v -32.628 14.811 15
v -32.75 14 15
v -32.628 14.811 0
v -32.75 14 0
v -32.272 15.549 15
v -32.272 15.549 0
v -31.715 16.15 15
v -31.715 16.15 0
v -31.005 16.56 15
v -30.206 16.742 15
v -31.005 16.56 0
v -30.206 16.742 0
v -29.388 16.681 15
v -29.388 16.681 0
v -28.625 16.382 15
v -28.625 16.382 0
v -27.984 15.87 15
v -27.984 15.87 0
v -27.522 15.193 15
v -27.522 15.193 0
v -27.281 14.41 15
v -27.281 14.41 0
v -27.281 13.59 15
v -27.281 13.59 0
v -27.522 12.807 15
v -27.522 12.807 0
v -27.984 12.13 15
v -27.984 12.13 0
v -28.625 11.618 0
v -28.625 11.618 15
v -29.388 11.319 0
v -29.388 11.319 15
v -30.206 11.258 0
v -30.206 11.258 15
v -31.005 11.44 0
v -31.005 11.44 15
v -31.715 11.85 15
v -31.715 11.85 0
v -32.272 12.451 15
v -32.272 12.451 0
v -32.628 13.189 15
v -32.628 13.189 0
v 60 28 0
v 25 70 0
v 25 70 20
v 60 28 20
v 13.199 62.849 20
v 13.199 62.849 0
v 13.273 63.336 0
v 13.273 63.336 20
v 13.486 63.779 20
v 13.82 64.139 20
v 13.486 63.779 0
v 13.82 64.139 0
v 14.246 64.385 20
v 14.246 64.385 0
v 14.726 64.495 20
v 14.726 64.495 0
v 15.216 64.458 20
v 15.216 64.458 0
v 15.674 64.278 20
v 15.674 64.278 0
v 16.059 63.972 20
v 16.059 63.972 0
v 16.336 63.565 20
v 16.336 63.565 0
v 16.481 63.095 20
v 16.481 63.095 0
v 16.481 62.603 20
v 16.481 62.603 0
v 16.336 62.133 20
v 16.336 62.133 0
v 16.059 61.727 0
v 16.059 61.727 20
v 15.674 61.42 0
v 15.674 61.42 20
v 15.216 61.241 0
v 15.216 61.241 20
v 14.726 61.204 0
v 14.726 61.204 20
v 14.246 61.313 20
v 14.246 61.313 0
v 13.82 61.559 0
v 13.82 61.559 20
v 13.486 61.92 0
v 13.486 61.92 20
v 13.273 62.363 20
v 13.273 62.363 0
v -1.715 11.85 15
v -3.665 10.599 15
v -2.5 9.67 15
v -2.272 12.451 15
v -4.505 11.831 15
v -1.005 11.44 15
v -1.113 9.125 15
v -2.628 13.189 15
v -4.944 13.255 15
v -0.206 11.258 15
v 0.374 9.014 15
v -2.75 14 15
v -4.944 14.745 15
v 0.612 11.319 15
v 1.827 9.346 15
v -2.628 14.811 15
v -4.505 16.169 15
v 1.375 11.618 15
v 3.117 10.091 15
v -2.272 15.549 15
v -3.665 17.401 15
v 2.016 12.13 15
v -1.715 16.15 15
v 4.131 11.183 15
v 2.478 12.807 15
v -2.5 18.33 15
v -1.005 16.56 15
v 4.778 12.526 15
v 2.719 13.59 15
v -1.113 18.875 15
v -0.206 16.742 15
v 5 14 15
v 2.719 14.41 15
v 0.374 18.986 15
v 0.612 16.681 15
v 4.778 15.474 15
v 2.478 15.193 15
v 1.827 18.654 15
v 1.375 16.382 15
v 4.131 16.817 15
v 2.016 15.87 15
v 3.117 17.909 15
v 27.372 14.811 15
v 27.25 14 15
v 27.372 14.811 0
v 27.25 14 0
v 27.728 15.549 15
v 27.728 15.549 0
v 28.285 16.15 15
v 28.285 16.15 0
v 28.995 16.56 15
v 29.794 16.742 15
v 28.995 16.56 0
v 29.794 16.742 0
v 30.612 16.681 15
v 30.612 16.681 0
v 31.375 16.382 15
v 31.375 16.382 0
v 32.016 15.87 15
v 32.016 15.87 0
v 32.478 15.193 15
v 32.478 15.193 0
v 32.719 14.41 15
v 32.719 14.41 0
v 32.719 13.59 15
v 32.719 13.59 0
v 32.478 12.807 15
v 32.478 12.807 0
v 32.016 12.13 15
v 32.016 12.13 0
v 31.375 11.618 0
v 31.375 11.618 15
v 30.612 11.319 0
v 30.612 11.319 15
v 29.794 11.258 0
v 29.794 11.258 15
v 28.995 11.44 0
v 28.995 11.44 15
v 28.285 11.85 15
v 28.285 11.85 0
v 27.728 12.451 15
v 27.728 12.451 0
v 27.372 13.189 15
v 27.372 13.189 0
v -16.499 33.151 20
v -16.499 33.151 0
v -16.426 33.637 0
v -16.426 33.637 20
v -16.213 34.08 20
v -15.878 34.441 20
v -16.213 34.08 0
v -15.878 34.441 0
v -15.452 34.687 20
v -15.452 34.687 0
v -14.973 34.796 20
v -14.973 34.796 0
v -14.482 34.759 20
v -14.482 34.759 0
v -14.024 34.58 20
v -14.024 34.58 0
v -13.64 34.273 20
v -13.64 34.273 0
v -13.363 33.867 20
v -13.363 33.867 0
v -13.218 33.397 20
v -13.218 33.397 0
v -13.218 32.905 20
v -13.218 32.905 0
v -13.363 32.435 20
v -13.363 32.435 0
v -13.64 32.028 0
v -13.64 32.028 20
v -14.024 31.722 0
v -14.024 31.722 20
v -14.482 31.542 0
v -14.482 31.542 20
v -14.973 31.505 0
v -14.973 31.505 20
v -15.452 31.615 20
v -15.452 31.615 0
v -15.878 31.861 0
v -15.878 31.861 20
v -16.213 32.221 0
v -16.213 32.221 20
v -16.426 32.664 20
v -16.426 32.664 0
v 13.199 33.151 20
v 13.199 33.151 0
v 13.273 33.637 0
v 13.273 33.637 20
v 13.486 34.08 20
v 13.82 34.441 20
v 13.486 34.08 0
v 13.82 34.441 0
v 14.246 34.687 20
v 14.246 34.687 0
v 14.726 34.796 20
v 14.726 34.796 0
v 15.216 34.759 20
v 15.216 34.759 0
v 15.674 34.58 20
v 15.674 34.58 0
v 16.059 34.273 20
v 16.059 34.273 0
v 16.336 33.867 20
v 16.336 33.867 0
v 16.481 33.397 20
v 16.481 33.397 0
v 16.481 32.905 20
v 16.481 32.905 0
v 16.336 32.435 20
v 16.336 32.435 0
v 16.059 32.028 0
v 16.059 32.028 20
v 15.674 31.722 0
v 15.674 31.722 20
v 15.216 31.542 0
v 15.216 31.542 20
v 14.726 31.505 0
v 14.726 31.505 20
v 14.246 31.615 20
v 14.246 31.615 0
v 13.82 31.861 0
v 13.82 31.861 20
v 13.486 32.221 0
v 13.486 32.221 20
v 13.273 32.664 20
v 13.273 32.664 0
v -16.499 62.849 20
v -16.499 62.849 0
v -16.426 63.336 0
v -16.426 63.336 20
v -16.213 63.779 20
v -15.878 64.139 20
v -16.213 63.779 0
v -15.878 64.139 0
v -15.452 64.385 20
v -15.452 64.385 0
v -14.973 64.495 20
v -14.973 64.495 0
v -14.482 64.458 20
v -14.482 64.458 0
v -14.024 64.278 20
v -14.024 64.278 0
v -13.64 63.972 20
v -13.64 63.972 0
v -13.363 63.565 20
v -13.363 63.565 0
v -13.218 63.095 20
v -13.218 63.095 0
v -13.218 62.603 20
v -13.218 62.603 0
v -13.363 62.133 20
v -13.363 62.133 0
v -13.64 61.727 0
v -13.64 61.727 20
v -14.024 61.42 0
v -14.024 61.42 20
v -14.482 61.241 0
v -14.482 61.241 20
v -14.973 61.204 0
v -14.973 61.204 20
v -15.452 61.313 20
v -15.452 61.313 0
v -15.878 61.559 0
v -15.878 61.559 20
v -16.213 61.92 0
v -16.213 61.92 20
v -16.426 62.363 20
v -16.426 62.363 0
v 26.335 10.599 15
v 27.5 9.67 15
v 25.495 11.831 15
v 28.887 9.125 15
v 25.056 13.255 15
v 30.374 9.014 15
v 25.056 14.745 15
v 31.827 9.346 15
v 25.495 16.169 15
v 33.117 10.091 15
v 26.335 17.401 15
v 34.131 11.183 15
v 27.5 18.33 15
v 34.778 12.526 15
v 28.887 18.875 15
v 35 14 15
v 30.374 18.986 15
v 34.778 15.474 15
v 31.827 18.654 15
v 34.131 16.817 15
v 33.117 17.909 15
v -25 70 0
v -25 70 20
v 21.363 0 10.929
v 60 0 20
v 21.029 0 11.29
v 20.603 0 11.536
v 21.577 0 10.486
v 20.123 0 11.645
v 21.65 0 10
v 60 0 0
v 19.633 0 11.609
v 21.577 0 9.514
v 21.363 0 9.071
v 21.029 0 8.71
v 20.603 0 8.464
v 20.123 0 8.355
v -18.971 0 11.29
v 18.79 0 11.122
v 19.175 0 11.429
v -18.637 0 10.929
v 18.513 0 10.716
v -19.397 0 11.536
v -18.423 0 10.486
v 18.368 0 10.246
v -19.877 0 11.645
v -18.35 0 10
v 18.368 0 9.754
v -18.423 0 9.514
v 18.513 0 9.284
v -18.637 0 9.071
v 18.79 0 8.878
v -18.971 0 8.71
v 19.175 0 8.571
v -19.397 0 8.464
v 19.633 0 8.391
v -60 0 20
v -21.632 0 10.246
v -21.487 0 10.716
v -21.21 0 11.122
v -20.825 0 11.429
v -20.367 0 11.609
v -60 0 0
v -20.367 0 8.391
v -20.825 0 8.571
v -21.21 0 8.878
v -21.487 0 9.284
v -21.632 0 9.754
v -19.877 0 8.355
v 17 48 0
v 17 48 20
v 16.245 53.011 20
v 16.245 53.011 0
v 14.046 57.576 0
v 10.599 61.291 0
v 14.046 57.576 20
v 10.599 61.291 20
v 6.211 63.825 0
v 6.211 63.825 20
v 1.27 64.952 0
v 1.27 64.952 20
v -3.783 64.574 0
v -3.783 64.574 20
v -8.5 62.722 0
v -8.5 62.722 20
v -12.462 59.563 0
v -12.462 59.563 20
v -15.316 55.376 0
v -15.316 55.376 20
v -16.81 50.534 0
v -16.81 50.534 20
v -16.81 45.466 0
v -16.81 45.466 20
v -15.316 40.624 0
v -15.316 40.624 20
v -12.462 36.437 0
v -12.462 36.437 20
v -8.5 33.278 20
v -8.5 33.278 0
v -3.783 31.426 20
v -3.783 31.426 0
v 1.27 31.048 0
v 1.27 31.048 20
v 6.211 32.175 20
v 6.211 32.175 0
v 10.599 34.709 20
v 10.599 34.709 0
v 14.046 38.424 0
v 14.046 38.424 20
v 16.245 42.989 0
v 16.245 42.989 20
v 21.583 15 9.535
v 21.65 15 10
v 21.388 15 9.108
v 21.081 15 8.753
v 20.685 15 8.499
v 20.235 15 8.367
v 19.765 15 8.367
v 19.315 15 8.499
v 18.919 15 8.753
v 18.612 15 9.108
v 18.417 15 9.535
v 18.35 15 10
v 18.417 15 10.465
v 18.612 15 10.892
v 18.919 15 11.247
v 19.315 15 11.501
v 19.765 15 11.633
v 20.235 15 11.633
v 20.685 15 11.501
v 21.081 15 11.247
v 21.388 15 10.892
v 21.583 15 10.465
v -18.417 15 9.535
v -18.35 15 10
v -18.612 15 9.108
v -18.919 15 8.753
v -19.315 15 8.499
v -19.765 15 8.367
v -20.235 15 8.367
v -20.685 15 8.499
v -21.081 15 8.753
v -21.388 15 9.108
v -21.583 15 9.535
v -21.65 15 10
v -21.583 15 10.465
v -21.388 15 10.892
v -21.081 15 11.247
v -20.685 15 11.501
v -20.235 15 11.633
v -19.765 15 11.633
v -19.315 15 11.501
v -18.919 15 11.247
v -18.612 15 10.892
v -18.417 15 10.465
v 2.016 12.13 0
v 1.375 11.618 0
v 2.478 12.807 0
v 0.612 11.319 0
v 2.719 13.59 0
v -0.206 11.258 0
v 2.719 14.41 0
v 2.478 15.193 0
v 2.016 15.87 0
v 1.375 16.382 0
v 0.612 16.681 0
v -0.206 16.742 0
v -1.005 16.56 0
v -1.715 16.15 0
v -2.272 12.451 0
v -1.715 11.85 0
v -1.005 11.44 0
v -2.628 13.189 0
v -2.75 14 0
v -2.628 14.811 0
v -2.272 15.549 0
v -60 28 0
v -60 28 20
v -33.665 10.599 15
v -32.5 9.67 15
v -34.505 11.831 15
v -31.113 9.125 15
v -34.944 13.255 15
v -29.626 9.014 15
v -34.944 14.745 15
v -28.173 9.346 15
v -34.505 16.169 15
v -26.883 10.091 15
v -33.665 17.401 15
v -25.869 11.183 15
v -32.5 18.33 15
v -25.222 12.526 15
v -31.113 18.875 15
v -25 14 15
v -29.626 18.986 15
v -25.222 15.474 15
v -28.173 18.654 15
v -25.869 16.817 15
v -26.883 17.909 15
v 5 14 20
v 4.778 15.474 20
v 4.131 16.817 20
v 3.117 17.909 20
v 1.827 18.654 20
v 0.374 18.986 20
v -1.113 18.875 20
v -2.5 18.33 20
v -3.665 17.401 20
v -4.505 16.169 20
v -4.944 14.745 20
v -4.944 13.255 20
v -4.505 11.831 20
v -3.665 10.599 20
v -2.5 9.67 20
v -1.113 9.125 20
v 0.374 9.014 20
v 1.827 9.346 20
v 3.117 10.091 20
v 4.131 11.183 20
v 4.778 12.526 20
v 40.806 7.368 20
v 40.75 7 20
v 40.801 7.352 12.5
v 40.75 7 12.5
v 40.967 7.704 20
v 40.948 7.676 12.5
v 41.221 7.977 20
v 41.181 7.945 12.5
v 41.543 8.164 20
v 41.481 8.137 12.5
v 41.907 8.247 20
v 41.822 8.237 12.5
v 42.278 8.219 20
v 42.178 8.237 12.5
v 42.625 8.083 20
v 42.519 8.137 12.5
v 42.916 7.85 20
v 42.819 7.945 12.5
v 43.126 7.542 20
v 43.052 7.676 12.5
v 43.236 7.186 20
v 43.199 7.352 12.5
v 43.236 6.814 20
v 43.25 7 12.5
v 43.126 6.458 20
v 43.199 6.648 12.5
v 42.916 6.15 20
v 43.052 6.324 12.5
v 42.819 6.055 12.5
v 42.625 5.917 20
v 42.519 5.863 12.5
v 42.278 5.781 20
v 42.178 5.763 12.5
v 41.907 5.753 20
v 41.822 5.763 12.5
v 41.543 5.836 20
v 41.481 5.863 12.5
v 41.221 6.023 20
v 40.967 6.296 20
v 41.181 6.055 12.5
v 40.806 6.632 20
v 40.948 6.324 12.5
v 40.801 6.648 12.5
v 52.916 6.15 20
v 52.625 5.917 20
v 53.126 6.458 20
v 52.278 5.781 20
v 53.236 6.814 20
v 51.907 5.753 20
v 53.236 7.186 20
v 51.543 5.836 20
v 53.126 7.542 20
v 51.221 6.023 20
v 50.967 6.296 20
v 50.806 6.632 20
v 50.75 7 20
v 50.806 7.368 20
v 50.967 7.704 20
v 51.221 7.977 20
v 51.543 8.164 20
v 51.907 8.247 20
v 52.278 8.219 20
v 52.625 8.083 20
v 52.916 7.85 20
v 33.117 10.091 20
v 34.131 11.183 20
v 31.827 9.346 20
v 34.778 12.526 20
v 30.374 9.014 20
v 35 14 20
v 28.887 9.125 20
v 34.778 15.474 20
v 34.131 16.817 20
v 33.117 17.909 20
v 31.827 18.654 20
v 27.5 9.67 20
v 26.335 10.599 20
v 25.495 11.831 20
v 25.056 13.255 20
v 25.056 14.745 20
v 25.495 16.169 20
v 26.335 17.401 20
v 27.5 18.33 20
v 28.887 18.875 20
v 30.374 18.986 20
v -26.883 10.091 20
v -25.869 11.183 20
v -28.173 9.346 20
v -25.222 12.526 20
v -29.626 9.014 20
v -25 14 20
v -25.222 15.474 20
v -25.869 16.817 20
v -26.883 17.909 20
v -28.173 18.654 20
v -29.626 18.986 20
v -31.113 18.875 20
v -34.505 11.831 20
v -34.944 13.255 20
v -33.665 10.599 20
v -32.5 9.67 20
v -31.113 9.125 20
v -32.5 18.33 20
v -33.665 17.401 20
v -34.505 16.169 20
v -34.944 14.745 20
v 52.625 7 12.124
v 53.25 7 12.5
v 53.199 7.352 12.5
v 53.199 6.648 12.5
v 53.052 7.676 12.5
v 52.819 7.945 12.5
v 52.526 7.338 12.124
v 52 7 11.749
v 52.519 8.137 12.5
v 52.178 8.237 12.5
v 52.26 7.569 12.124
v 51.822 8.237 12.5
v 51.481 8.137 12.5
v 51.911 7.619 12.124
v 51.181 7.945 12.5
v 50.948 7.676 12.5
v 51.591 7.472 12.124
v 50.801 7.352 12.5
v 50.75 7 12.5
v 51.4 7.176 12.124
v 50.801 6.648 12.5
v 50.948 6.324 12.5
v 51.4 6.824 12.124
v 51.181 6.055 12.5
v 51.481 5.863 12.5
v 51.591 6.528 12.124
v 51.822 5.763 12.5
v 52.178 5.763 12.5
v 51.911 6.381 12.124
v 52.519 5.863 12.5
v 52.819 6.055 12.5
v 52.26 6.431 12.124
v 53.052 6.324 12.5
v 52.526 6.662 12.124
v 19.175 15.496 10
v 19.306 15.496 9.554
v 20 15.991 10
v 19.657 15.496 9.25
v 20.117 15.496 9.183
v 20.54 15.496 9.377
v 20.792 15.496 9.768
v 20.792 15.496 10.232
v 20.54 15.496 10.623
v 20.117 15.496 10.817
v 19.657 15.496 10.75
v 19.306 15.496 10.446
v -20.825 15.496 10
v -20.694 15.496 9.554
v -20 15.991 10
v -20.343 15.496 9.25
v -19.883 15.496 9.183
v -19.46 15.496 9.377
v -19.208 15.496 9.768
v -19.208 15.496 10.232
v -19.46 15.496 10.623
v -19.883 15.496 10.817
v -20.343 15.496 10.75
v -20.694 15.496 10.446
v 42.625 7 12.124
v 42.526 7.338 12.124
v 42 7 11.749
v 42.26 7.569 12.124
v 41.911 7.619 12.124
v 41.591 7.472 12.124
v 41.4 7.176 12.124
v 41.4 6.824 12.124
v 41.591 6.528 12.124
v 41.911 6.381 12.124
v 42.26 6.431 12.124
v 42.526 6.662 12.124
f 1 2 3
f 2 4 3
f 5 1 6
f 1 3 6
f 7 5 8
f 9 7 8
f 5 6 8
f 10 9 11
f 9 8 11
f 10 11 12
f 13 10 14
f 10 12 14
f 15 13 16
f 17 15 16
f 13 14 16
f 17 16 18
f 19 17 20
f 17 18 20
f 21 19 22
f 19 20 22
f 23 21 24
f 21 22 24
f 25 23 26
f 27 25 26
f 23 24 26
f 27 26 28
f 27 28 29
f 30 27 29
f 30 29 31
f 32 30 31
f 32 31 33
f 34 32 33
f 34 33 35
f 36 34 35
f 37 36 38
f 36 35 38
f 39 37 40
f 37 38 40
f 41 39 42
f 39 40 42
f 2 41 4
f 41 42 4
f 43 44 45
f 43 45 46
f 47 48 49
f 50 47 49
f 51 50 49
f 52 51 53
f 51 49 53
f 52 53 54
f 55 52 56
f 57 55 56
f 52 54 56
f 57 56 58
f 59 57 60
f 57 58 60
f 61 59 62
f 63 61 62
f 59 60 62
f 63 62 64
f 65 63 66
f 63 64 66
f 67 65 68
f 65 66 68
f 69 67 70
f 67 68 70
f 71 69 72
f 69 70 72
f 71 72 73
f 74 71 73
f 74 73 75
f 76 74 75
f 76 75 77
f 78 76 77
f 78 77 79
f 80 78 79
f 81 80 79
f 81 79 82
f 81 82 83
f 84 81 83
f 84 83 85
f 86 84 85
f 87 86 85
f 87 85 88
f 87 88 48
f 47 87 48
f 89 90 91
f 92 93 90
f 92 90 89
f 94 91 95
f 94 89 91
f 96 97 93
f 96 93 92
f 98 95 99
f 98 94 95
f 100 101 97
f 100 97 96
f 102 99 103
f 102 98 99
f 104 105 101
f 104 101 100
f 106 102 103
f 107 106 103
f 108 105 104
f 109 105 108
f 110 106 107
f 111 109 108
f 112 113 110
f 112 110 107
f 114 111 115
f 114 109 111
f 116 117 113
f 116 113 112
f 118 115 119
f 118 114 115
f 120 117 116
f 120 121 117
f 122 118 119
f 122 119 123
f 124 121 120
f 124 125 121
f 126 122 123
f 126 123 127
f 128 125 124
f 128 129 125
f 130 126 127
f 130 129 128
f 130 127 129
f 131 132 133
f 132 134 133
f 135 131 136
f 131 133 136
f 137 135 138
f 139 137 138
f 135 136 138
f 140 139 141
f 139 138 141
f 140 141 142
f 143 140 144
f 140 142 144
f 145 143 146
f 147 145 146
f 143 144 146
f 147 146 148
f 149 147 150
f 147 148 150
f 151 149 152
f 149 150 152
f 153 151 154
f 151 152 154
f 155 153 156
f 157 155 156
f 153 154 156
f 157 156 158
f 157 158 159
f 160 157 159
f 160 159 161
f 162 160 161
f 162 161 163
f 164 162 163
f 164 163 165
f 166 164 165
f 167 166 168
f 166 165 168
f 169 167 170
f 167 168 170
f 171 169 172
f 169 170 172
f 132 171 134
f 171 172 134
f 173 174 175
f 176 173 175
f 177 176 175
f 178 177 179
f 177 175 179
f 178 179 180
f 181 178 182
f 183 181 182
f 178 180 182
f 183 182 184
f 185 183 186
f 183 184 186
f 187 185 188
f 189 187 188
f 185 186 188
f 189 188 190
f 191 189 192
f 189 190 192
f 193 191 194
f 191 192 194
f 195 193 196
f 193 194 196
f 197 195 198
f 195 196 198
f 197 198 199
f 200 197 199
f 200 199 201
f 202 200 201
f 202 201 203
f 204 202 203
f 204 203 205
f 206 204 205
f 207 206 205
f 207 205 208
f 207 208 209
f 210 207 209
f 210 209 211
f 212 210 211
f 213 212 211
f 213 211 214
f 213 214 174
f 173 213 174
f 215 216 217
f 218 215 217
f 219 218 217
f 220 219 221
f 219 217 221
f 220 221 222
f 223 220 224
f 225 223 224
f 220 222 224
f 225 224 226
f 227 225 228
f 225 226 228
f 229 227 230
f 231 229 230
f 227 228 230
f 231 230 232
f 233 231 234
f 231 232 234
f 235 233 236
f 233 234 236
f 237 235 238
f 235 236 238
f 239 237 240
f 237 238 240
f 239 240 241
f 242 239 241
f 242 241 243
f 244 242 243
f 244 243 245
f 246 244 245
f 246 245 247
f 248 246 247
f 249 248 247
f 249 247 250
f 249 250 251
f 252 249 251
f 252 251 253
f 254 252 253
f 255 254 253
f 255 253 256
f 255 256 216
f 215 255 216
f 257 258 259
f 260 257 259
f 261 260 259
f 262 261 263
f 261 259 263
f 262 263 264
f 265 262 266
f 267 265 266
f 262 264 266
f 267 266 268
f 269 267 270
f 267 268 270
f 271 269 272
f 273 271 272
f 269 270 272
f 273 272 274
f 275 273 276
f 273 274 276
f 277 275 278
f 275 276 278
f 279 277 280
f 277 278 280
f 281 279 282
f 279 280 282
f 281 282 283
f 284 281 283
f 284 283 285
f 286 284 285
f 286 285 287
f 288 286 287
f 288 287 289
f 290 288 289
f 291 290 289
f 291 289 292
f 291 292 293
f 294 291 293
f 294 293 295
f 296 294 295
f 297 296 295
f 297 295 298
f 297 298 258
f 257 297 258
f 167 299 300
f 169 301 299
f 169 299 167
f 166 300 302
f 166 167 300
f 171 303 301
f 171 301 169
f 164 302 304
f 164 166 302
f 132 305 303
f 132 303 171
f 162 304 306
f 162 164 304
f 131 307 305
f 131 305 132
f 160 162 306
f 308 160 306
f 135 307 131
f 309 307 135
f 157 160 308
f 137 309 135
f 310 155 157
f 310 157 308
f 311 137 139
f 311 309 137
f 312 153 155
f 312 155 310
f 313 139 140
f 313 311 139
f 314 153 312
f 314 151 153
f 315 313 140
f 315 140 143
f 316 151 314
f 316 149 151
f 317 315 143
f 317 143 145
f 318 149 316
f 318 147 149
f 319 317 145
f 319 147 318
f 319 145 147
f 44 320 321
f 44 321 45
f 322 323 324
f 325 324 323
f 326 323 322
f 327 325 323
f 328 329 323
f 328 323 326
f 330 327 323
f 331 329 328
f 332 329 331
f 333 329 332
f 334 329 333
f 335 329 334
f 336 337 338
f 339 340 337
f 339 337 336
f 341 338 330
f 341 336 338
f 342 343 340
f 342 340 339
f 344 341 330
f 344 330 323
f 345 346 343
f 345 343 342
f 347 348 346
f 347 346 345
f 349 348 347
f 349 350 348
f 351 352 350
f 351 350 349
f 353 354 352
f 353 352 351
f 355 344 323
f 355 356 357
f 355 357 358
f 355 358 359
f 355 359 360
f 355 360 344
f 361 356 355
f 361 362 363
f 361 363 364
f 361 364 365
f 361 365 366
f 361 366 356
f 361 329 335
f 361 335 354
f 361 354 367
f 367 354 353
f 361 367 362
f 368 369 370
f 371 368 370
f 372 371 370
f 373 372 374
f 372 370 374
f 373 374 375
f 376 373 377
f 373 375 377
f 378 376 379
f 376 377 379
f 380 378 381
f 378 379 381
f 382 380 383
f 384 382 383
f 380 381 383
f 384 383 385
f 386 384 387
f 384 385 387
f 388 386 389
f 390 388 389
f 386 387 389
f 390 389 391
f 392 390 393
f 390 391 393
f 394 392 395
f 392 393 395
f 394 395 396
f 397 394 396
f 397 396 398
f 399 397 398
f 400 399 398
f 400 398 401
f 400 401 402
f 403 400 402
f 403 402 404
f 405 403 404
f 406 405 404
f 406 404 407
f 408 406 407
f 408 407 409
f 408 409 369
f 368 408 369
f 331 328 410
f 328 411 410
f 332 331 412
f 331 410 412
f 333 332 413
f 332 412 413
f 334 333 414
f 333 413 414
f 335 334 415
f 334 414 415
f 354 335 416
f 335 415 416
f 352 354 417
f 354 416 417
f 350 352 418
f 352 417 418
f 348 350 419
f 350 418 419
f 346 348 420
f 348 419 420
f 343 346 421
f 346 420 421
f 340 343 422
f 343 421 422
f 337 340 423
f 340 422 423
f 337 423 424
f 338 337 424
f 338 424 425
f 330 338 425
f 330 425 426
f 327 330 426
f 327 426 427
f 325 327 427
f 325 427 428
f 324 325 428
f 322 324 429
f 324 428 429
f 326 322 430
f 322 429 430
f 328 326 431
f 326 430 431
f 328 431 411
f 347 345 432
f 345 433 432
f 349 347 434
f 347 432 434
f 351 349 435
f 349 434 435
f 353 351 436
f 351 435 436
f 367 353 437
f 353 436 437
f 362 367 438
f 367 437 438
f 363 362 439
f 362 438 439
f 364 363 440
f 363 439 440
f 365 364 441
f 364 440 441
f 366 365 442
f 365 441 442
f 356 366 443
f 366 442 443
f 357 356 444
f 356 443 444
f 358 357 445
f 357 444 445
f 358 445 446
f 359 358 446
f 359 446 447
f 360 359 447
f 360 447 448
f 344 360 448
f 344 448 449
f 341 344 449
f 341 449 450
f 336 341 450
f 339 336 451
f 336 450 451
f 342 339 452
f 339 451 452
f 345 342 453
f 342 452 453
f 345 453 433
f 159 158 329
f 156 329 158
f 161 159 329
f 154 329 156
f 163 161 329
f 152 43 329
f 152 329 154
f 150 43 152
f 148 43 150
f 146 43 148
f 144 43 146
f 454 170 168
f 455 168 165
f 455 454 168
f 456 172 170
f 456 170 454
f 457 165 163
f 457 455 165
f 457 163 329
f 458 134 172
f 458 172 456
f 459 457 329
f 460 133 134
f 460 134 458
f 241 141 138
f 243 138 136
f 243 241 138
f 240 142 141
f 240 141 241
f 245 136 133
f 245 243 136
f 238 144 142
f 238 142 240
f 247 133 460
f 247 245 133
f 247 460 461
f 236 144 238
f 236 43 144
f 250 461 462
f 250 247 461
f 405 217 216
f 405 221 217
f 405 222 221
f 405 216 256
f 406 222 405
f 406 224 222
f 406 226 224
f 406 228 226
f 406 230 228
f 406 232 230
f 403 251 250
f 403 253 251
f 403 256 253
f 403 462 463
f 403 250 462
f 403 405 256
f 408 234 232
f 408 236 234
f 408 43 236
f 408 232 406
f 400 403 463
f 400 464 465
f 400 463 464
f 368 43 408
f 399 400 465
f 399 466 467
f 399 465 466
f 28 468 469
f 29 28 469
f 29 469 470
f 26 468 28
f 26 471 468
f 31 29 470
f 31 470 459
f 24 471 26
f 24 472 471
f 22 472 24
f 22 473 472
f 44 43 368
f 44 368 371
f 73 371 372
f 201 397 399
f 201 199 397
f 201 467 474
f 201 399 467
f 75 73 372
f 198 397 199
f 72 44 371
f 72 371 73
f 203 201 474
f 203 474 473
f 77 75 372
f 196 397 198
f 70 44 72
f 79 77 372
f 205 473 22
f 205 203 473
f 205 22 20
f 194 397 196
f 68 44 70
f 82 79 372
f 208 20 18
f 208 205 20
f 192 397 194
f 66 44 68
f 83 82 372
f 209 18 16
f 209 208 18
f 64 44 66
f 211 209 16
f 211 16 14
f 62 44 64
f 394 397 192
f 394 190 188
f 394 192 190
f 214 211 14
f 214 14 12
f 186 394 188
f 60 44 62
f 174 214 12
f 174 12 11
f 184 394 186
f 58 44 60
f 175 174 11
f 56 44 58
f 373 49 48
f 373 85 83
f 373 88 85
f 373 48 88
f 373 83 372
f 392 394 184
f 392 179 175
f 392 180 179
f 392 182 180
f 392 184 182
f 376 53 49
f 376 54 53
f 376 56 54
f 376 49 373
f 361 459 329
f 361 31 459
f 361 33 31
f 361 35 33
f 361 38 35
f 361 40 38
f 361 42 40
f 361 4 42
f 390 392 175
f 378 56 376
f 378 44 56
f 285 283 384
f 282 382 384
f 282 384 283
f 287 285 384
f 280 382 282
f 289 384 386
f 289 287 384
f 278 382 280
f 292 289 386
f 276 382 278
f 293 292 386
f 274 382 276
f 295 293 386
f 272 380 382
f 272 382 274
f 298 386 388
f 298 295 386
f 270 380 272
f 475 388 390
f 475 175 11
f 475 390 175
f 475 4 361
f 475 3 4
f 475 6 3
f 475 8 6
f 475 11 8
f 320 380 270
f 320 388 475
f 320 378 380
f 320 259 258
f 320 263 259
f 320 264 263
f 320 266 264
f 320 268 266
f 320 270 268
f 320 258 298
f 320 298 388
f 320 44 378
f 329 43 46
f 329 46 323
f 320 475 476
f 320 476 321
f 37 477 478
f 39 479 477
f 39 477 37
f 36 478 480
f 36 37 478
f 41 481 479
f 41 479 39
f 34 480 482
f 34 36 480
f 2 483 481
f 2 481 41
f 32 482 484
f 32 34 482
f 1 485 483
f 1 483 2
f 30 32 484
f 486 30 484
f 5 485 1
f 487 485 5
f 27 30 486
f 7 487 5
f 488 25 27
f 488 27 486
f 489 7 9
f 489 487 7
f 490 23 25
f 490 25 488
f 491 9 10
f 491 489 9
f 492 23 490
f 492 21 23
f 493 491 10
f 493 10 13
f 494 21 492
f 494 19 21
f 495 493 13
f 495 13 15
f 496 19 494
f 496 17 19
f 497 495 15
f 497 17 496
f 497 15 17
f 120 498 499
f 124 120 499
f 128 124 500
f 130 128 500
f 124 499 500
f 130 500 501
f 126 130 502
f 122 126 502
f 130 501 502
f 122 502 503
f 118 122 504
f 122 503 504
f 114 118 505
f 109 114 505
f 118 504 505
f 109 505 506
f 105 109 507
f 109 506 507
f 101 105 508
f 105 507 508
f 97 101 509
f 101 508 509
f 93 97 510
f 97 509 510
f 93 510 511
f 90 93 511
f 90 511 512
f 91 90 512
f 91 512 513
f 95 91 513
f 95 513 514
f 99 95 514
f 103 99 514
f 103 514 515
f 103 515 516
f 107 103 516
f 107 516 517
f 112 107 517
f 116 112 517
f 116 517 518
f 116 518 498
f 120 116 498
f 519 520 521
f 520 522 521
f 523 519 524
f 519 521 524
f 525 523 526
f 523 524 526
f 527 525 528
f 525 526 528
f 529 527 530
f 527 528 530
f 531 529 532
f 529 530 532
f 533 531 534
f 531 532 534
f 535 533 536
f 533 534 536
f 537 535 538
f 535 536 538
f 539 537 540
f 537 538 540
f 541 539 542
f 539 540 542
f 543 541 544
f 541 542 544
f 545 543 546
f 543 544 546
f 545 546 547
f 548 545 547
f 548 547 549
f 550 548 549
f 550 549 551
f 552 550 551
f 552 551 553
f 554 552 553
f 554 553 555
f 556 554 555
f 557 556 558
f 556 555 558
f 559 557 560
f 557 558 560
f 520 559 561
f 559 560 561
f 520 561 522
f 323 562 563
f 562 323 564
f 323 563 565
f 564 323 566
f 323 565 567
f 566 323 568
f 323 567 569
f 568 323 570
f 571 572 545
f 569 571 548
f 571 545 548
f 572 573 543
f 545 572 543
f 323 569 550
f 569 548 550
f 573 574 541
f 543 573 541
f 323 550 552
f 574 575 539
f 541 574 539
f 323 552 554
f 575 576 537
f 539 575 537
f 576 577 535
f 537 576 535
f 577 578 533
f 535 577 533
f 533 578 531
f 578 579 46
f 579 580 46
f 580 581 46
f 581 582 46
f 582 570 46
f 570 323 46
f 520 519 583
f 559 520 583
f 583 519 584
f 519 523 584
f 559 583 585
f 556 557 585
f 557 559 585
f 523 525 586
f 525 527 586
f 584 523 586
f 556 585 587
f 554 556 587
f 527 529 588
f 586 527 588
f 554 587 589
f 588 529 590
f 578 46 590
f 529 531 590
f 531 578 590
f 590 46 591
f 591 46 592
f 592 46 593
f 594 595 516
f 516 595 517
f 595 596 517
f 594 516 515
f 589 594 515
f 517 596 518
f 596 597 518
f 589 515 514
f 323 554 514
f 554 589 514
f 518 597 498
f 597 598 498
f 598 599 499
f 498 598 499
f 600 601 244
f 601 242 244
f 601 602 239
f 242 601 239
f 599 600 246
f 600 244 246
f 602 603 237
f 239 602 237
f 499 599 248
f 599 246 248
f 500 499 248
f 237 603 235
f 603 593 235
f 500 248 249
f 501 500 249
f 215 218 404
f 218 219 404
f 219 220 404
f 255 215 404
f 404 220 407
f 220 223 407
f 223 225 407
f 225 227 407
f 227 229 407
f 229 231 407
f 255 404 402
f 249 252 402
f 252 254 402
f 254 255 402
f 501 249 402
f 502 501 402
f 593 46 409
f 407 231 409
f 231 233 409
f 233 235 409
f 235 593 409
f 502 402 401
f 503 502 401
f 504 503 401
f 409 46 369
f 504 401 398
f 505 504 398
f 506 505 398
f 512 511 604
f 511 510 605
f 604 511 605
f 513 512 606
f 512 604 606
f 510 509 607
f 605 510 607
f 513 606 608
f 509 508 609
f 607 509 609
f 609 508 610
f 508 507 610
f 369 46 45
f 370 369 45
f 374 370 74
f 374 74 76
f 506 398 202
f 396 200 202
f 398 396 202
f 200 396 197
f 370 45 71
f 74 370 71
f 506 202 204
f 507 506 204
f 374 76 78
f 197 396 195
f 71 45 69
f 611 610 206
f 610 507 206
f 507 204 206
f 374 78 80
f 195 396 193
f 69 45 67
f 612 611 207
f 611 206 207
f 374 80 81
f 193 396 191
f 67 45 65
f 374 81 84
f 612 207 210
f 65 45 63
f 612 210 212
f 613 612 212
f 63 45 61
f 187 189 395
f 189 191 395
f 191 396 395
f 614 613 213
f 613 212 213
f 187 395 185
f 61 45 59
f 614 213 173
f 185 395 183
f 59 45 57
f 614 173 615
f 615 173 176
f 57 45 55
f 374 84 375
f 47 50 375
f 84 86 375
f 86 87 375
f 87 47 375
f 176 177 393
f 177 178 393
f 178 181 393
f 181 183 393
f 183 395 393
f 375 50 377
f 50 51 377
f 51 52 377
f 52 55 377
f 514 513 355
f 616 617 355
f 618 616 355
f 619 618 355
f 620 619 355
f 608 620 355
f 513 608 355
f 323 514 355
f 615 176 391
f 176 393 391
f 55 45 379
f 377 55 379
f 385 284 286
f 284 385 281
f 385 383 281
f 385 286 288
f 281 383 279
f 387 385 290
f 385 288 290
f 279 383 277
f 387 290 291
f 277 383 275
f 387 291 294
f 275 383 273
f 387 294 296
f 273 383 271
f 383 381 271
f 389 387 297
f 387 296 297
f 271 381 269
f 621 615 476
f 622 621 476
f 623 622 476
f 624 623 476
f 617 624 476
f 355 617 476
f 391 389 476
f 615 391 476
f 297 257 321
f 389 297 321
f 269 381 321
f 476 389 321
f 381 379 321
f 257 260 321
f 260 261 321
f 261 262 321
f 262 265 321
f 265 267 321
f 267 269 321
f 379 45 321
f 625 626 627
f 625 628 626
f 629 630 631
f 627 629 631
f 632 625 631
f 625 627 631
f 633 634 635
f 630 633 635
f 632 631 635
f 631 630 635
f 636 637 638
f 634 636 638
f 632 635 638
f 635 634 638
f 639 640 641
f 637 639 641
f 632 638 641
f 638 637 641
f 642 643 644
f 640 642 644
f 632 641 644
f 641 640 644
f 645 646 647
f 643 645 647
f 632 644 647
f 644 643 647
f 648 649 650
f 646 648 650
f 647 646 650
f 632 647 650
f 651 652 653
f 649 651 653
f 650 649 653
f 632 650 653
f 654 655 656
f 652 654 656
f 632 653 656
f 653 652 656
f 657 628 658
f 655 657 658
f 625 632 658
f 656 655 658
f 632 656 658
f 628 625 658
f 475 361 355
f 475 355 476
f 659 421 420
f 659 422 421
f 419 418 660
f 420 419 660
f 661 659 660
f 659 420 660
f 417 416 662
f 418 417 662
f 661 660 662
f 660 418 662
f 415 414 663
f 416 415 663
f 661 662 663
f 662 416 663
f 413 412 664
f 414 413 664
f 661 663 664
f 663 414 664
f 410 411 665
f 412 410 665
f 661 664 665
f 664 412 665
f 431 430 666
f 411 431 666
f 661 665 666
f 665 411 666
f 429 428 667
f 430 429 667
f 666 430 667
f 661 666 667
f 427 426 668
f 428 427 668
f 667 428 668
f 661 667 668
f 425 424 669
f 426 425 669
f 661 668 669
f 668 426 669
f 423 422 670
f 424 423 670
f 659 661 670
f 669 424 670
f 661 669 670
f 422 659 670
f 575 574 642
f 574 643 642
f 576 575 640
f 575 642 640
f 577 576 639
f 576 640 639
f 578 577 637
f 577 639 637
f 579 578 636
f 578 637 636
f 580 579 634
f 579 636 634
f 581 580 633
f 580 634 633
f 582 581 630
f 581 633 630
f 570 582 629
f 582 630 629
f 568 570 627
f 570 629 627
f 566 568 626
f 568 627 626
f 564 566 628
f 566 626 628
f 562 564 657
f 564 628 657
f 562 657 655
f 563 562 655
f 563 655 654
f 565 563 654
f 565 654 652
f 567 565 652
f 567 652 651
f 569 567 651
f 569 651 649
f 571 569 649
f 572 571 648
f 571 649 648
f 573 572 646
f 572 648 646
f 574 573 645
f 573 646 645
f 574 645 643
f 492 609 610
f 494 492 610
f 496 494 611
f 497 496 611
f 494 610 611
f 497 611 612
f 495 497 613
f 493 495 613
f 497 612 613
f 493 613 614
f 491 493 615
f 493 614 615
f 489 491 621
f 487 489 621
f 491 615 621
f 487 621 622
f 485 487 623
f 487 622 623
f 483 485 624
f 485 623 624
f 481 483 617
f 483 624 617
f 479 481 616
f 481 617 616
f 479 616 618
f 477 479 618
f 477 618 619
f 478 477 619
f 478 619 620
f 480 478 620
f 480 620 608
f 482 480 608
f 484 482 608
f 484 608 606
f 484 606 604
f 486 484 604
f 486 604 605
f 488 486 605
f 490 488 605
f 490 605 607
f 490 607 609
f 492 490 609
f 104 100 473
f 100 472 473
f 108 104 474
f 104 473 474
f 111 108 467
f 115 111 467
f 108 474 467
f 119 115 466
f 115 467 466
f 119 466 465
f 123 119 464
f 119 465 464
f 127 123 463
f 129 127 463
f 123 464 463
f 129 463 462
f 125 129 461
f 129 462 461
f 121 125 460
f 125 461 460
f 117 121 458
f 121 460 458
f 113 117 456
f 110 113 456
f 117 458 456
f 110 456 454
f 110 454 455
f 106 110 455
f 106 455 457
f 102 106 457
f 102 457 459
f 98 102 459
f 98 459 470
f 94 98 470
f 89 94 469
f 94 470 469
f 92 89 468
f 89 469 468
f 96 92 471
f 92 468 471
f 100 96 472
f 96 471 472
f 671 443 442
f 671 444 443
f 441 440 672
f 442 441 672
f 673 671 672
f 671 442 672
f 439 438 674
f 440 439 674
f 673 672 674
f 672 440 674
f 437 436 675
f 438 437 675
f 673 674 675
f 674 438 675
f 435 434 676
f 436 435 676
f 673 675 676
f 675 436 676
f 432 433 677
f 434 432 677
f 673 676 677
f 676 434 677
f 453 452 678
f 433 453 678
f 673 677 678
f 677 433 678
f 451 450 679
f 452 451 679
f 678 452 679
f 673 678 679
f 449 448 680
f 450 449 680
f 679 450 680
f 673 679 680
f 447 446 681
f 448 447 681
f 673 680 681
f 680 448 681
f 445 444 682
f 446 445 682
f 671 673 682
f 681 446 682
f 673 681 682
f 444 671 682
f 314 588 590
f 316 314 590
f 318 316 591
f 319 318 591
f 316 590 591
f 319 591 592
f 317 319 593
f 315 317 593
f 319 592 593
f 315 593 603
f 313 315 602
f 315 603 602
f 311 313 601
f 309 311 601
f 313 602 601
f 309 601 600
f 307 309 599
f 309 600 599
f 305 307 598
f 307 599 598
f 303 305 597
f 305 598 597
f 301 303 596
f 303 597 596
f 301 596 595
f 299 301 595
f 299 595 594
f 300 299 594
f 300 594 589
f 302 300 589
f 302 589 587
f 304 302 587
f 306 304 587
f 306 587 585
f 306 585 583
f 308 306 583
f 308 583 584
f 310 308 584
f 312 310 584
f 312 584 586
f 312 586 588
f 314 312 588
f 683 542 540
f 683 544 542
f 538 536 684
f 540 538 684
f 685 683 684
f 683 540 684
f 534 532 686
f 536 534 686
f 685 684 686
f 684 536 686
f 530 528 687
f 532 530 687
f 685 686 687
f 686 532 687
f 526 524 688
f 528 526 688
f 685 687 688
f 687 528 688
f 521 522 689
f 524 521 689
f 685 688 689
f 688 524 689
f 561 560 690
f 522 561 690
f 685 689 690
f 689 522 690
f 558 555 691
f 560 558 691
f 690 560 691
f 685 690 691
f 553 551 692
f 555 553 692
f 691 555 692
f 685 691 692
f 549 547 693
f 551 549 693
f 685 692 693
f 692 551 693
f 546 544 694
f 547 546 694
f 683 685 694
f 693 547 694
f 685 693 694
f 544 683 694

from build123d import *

# Parameters (mm, degrees)
BOSS_EXTRUDE1_DEPTH            = 20
CBORE_FOR_M5_SHCS1_D           = 5.5
CBORE_FOR_M5_SHCS1_CBORE_D     = 10
CBORE_FOR_M5_SHCS1_CBORE_DEPTH = 5
SKETCH4_R                      = 17
CUT_EXTRUDE1_DEPTH             = 95.339811321
M4_TAPPED_HOLE1_D              = 3.3
M4_TAPPED_HOLE2_D              = 3.3
M4_TAPPED_HOLE2_DEPTH          = 15
M4_TAPPED_HOLE2_TIP            = 0.991420021
M3_TAPPED_HOLE1_D              = 2.5
M3_TAPPED_HOLE1_DEPTH          = 7.5
M3_TAPPED_HOLE1_TIP            = 0.751075774


with BuildPart() as part:
    # Sketch1 → Boss-Extrude1 (new body)
    with BuildSketch(Plane.XY):
        Polygon((60, 0), (-60, 0), (-60, 28), (-25, 70), (25, 70), (60, 28), align=None)
    extrude(amount=BOSS_EXTRUDE1_DEPTH)

    # CBORE for M5 SHCS1 (through all)
    with Locations(Plane(origin=(-30, 14, 20), x_dir=(1, 0, 0), z_dir=(0, 0, 1))):
        with Locations((0, 0), (30, 0), (60, 0)):
            CounterBoreHole(CBORE_FOR_M5_SHCS1_D / 2, CBORE_FOR_M5_SHCS1_CBORE_D / 2, CBORE_FOR_M5_SHCS1_CBORE_DEPTH)

    # Sketch4 → Cut-Extrude1 (cut, through all)
    with BuildSketch(Plane.XY.offset(20)):
        with Locations((0, 48)):
            Circle(SKETCH4_R)
    extrude(amount=-CUT_EXTRUDE1_DEPTH, mode=Mode.SUBTRACT)

    # M4 Tapped Hole1 (through all)
    with Locations(Plane(origin=(-14.849242405, 62.849242405, 20), x_dir=(1, 0, 0), z_dir=(0, 0, 1))):
        with Locations((0, 0), (29.69848481, 0), (29.69848481, -29.69848481), (0, -29.69848481)):
            Hole(M4_TAPPED_HOLE1_D / 2)

    # M4 Tapped Hole2
    with Locations(Plane(origin=(0, 0, 0), x_dir=(-1, 0, 0), z_dir=(0, -1, 0))):
        with Locations((20, -10), (-20, -10)):
            Hole(M4_TAPPED_HOLE2_D / 2, depth=M4_TAPPED_HOLE2_DEPTH)
            with Locations((0, 0, -(M4_TAPPED_HOLE2_DEPTH + M4_TAPPED_HOLE2_TIP / 2))):  # 118° drill point
                Cone(0, M4_TAPPED_HOLE2_D / 2, M4_TAPPED_HOLE2_TIP, mode=Mode.SUBTRACT)

    # M3 Tapped Hole1
    with Locations(Plane(origin=(42, 7, 20), x_dir=(1, 0, 0), z_dir=(0, 0, 1))):
        with Locations((0, 0), (10, 0)):
            Hole(M3_TAPPED_HOLE1_D / 2, depth=M3_TAPPED_HOLE1_DEPTH)
            with Locations((0, 0, -(M3_TAPPED_HOLE1_DEPTH + M3_TAPPED_HOLE1_TIP / 2))):  # 118° drill point
                Cone(0, M3_TAPPED_HOLE1_D / 2, M3_TAPPED_HOLE1_TIP, mode=Mode.SUBTRACT)


solid = part.part
